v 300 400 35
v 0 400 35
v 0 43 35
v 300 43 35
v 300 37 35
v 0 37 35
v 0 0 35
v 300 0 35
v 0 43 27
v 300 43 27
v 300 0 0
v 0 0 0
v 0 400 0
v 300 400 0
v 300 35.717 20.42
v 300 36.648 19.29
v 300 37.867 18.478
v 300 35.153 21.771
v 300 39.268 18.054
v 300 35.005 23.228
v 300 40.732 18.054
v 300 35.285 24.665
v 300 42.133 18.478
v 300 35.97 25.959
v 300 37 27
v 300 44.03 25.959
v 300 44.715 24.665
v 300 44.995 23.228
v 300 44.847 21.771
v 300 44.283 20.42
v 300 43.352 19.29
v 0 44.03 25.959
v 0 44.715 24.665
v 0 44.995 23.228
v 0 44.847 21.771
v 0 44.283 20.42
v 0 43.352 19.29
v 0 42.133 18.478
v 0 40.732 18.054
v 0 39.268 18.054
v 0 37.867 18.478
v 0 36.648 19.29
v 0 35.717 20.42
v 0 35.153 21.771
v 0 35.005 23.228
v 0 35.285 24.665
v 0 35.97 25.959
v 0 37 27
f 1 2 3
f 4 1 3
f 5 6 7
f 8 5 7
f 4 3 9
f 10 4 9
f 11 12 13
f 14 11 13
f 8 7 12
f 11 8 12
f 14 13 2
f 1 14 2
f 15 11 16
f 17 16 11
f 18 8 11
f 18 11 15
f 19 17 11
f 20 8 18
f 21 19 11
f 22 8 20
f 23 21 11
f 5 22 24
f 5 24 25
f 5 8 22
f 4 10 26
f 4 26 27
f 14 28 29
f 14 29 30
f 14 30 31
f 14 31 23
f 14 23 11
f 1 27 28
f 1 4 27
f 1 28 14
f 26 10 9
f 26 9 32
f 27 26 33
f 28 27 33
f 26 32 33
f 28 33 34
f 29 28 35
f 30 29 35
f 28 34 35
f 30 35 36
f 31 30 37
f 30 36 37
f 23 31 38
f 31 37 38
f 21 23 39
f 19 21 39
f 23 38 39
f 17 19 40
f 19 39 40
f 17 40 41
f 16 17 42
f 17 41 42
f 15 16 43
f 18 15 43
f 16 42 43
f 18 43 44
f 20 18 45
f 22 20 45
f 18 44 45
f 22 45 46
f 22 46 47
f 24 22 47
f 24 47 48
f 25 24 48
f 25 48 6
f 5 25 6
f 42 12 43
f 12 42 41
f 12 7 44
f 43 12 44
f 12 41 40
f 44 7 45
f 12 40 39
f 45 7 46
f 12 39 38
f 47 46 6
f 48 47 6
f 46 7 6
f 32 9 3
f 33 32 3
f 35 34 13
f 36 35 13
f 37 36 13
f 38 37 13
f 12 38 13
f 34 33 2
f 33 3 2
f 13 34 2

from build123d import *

# Parameters (mm, degrees)
F1_DEPTH = 300


with BuildPart() as f1:
    # F0 (on Right) → F1 (new body)
    with BuildSketch(Plane.YZ):
        with BuildLine():
            Line((0, 35), (0, 0))
            Line((0, 0), (400, 0))
            Line((400, 0), (400, 35))
            Line((400, 35), (43, 35))
            Line((43, 35), (43, 27))
            ThreePointArc((43, 27), (40, 18), (37, 27))
            Line((37, 27), (37, 35))
            Line((37, 35), (0, 35))
        make_face()
    extrude(amount=F1_DEPTH)


solid = f1.part
